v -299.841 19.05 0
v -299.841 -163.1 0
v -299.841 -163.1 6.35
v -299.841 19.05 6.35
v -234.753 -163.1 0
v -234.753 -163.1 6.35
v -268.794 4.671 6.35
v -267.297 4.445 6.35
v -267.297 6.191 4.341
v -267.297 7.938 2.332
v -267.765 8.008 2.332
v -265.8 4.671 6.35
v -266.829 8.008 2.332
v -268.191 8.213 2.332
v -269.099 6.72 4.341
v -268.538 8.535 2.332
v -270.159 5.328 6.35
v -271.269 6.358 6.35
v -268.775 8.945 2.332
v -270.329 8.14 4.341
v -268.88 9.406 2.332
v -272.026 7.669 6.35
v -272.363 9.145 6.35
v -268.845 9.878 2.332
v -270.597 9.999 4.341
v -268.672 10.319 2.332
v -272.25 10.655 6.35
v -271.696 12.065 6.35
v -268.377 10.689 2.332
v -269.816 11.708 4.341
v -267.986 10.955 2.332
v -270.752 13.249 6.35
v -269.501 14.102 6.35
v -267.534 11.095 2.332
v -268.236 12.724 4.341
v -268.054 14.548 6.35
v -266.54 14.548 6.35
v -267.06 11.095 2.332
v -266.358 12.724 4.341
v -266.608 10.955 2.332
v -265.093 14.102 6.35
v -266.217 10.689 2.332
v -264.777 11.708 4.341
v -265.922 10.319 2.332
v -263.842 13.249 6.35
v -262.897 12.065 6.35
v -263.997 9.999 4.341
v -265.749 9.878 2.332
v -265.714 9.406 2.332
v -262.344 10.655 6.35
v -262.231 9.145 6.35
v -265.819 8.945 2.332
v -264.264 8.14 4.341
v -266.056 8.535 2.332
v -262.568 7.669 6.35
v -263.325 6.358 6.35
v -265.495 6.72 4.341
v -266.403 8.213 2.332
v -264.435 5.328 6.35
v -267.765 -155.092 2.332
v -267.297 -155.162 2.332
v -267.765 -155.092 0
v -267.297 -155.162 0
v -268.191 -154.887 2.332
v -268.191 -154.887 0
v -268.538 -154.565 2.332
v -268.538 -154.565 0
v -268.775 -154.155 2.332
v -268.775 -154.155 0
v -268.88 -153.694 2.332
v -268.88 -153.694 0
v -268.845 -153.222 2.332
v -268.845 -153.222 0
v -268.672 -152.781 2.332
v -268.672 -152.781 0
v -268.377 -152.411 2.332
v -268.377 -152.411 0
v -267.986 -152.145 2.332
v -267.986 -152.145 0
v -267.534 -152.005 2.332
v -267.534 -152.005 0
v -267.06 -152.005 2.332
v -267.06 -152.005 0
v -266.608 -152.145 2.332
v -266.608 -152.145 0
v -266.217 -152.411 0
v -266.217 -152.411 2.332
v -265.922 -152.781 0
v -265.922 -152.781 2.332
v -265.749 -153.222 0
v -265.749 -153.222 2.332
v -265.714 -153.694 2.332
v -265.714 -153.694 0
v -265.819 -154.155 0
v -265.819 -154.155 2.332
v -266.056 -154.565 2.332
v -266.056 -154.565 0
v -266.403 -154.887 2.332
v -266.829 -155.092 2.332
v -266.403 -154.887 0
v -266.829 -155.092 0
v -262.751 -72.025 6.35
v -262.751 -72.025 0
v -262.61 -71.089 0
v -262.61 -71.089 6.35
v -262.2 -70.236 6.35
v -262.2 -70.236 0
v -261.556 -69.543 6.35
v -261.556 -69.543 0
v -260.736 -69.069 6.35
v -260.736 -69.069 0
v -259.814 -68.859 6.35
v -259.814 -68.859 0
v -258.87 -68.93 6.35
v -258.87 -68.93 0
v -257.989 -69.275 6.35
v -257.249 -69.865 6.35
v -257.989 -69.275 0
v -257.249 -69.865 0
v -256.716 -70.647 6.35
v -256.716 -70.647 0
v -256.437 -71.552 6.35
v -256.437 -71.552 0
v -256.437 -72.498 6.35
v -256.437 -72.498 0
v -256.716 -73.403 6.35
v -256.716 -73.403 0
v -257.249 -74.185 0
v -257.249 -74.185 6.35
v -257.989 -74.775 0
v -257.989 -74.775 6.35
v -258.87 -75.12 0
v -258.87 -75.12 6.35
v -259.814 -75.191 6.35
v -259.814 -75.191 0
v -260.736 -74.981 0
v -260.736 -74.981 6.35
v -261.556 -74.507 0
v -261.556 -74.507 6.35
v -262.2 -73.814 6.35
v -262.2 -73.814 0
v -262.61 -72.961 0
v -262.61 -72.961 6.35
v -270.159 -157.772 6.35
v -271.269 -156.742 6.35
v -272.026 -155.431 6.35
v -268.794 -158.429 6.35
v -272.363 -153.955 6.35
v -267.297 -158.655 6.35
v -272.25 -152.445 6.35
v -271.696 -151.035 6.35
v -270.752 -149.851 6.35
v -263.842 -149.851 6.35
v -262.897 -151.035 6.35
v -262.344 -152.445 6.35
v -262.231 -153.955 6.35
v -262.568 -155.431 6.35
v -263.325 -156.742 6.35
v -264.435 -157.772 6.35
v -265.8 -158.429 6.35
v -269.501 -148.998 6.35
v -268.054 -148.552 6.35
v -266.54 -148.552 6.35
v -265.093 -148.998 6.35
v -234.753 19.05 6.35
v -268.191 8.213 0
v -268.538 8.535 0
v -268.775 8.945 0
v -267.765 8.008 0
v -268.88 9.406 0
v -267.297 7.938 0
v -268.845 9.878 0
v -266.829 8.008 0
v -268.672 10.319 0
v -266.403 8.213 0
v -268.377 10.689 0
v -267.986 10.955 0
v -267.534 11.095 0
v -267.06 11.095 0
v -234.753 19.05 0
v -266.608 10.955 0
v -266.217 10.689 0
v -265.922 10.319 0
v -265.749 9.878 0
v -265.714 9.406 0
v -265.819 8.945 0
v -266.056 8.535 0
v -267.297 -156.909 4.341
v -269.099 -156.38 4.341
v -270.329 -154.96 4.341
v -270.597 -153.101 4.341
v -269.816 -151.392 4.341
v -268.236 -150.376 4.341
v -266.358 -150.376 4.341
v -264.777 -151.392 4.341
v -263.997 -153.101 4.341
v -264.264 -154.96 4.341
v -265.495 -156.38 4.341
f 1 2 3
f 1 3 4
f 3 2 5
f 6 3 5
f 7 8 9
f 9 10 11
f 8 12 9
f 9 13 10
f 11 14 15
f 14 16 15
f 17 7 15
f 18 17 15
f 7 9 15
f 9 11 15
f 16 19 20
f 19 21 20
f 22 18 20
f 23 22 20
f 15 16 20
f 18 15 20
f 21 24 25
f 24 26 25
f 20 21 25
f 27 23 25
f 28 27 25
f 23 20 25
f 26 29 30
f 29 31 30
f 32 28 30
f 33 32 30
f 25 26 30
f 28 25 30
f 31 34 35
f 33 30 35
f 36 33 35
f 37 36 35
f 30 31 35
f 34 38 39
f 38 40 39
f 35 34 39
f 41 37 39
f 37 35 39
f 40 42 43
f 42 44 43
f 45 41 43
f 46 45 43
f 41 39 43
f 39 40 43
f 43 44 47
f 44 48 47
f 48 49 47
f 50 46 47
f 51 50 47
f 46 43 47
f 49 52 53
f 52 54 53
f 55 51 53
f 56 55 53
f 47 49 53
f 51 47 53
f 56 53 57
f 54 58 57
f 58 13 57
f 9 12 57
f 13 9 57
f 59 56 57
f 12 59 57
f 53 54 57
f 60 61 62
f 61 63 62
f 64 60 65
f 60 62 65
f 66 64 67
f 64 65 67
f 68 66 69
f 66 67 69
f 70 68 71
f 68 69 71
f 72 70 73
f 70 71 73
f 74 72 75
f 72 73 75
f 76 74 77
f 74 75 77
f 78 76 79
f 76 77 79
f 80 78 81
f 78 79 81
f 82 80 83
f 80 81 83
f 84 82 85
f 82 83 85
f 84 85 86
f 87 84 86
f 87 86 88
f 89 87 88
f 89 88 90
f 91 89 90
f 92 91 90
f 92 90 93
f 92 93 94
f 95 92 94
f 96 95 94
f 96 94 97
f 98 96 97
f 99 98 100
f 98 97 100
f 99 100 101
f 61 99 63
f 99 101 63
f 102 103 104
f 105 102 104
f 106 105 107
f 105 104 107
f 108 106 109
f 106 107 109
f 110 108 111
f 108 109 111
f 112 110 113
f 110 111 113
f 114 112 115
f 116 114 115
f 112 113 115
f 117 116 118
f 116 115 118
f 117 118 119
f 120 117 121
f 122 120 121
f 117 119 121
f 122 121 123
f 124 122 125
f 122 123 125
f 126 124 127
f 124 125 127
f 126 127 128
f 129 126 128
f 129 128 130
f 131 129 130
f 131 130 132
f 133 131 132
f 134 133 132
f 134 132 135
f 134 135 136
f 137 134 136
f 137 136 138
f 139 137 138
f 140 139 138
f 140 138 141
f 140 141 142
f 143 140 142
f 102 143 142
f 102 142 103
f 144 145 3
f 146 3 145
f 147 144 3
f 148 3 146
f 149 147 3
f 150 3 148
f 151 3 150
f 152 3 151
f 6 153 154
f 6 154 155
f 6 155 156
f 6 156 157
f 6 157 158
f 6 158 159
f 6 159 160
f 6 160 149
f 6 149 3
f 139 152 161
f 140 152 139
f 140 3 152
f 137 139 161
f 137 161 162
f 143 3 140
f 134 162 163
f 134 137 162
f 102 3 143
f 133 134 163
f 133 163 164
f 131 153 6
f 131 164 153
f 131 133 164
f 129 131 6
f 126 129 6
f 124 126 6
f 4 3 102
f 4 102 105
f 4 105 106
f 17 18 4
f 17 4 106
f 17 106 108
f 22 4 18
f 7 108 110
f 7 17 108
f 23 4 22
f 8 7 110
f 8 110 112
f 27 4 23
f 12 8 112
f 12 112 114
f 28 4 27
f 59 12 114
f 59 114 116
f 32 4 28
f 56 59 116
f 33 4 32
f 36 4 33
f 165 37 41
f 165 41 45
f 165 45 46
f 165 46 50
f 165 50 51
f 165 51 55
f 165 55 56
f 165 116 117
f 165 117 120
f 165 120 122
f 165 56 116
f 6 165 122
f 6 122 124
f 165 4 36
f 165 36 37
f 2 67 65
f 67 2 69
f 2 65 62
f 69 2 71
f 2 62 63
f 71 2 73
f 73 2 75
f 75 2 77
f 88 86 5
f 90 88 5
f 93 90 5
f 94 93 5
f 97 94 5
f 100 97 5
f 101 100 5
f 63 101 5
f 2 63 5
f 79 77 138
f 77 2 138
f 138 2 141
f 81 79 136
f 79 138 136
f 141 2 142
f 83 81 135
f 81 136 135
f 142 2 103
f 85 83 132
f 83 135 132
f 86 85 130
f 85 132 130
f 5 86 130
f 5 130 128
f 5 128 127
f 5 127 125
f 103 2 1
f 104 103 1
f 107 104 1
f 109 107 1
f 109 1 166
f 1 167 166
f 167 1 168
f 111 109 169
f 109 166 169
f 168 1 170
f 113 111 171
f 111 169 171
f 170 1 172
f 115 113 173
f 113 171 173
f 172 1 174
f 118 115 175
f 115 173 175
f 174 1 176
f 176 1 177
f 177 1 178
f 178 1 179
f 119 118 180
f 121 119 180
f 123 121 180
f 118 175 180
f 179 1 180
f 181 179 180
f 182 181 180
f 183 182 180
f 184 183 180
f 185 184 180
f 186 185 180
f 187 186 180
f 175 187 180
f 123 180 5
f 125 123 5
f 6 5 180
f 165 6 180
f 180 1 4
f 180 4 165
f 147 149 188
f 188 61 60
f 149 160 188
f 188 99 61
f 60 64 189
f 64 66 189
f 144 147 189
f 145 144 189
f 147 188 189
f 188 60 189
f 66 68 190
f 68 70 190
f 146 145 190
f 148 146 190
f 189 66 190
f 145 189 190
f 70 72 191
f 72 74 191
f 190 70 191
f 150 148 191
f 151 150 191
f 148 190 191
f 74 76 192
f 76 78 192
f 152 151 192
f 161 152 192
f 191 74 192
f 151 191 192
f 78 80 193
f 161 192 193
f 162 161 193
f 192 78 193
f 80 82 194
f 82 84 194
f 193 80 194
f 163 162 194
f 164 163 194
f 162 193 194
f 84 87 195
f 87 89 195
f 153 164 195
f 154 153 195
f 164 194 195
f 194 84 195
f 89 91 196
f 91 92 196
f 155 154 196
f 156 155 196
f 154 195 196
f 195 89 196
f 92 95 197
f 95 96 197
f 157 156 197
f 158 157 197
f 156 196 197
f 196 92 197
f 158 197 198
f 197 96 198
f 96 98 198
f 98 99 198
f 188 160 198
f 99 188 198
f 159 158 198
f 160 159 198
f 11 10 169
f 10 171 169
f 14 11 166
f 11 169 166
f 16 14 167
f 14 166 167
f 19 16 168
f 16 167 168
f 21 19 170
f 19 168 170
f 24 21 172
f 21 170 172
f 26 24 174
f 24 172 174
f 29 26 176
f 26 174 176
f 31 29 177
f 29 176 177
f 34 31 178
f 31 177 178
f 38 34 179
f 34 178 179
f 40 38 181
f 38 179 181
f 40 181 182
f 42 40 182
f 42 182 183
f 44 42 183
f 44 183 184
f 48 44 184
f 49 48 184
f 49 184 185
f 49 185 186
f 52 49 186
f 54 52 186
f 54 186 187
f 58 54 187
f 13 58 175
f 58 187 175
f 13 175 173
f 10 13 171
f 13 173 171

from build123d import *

# Parameters (mm, degrees)
SKETCH1_W                   = 65.087862113
SKETCH1_H                   = 182.149999994
BOSS_EXTRUDE1_DEPTH         = 6.35
F_1_4_0_25_DIAMETER_HOLE1_D = 6.35
HOLE1_D                     = 3.175
HOLE1_DEPTH                 = 31.75
HOLE1_CSINK_D               = 10.16
HOLE1_CSINK_ANGLE           = 82
HOLE1_TIP                   = 0.953866233


with BuildPart() as part:
    # Sketch1 → Boss-Extrude1 (new body)
    with BuildSketch(Plane.XY):
        with Locations((-267.296898237, -72.024999997)):
            Rectangle(SKETCH1_W, SKETCH1_H)
    extrude(amount=BOSS_EXTRUDE1_DEPTH)

    # 1/4 (0.25) Diameter Hole1 (through all)
    with Locations(Plane.XY.offset(6.35)):
        with Locations((-259.576391655, -72.024999997)):
            Hole(F_1_4_0_25_DIAMETER_HOLE1_D / 2)

    # Hole1
    with Locations(Plane(origin=(181.039434513, -72.024999997, 6.35), x_dir=(0, 1, 0), z_dir=(0, 0, 1))):
        with Locations((81.549999997, 448.336332751), (-81.549999997, 448.336332751)):
            CounterSinkHole(HOLE1_D / 2, HOLE1_CSINK_D / 2, depth=HOLE1_DEPTH, counter_sink_angle=HOLE1_CSINK_ANGLE)
            with Locations((0, 0, -(HOLE1_DEPTH + HOLE1_TIP / 2))):  # 118° drill point
                Cone(0, HOLE1_D / 2, HOLE1_TIP, mode=Mode.SUBTRACT)


solid = part.part
